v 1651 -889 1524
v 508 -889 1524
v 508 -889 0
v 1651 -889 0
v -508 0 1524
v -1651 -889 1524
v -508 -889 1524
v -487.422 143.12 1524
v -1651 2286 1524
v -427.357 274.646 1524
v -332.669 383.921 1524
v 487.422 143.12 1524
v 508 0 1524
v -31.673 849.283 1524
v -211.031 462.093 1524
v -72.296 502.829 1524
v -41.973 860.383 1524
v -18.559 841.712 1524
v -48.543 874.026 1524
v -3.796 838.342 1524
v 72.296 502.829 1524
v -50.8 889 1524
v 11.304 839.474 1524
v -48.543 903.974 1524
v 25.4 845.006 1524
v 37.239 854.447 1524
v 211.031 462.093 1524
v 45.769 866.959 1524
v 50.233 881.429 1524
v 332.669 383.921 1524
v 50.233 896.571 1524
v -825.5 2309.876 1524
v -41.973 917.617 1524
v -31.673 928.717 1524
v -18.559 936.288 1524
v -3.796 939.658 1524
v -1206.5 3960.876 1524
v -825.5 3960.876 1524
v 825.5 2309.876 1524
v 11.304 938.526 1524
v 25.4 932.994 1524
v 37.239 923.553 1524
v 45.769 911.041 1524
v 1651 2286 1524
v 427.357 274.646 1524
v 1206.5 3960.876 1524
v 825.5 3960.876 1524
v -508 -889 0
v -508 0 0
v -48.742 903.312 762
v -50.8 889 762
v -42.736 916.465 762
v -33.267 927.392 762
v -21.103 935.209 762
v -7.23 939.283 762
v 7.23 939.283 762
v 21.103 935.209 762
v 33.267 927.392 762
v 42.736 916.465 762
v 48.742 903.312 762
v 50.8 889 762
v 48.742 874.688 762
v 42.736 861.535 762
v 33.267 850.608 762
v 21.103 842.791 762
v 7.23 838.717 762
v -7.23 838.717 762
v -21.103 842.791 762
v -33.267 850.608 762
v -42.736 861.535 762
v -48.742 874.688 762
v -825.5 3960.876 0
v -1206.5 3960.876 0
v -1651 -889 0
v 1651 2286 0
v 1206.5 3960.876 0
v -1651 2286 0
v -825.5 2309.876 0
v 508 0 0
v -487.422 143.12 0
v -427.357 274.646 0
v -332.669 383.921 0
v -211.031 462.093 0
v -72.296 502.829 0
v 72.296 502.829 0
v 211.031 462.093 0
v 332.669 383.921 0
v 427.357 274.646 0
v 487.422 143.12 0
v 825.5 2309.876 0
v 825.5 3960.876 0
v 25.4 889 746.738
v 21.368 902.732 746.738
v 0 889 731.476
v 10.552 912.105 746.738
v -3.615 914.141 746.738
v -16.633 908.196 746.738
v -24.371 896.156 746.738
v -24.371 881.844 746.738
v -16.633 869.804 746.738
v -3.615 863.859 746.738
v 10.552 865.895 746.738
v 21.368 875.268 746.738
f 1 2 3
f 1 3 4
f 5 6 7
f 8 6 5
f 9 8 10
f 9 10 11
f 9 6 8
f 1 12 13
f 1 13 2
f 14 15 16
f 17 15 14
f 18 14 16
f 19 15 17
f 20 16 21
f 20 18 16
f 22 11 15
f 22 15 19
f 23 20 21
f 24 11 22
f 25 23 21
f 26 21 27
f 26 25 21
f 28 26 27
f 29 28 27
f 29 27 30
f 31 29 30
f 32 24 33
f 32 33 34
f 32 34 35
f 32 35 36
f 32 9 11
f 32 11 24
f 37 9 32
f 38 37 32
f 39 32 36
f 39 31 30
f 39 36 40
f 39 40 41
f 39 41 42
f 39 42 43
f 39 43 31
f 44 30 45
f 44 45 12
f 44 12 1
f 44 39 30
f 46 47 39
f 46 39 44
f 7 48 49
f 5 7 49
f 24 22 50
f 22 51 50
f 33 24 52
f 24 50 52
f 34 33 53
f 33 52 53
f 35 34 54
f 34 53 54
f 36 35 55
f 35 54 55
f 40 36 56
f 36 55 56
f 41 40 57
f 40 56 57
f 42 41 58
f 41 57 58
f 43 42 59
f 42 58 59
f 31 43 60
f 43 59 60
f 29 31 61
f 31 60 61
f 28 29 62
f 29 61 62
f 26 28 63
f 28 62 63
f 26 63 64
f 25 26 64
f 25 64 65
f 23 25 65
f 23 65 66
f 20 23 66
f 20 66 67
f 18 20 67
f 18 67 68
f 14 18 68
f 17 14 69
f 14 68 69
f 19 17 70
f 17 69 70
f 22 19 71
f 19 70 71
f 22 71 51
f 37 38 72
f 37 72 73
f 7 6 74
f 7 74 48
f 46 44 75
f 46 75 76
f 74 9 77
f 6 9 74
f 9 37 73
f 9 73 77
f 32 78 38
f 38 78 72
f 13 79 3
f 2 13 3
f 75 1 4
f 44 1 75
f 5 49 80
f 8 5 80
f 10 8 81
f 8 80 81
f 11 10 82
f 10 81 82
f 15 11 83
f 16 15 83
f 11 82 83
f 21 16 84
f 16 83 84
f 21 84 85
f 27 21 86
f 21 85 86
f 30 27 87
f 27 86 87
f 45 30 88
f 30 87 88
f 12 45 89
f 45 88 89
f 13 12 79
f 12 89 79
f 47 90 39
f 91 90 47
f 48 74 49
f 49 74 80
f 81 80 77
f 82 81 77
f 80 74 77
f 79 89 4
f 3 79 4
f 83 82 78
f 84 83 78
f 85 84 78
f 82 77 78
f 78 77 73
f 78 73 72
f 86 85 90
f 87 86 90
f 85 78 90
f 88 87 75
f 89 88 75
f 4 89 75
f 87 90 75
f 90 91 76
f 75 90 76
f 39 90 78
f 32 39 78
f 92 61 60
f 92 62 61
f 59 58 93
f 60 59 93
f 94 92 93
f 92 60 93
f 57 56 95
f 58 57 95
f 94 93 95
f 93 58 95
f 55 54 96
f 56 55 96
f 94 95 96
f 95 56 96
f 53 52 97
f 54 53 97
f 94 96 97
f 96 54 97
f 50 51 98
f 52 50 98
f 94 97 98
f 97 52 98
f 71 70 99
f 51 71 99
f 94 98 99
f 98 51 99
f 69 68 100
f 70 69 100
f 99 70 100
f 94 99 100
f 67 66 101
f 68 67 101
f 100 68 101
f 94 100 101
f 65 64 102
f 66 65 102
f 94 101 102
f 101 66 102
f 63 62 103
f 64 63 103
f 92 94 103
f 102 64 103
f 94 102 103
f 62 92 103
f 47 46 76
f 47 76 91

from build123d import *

# Parameters (mm, degrees)
BOSS_EXTRUDE1_DEPTH = 1524
CUT_EXTRUDE1_DEPTH  = 4554.780373204
SKETCH3_W           = 1651
SKETCH3_H           = 1651
CUT_EXTRUDE2_DEPTH  = 4554.780373204
HOLE1_D             = 101.6
HOLE1_DEPTH         = 762
HOLE1_TIP           = 30.523719447


with BuildPart() as part:
    # Sketch1 → Boss-Extrude1 (new body)
    with BuildSketch(Plane.XY.offset(1524)):
        Polygon((-1651, 2286), (-1651, -889), (1651, -889), (1651, 2286), (1206.5, 3960.876), (-1206.5, 3960.876), align=None)
    extrude(amount=-BOSS_EXTRUDE1_DEPTH)

    # Sketch2 → Cut-Extrude1 (cut, through all)
    with BuildSketch(Plane(origin=(0, 0, 0), x_dir=(-1, 0, 0), z_dir=(0, 0, -1))):
        with BuildLine():
            Line((-508, -889), (508, -889))
            Line((508, -889), (508, 0))
            ThreePointArc((508, 0), (0, 508), (-508, 0))
            Line((-508, 0), (-508, -889))
        make_face()
    extrude(amount=-CUT_EXTRUDE1_DEPTH, mode=Mode.SUBTRACT)

    # Sketch3 → Cut-Extrude2 (cut, through all)
    with BuildSketch(Plane(origin=(0, 0, 0), x_dir=(-1, 0, 0), z_dir=(0, 0, -1))):
        with Locations((0, 3135.376)):
            Rectangle(SKETCH3_W, SKETCH3_H)
    extrude(amount=-CUT_EXTRUDE2_DEPTH, mode=Mode.SUBTRACT)

    # Hole1
    with Locations(Plane.XY.offset(1524)):
        with Locations((0, 889)):
            Hole(HOLE1_D / 2, depth=HOLE1_DEPTH)
            with Locations((0, 0, -(HOLE1_DEPTH + HOLE1_TIP / 2))):  # 118° drill point
                Cone(0, HOLE1_D / 2, HOLE1_TIP, mode=Mode.SUBTRACT)


solid = part.part
